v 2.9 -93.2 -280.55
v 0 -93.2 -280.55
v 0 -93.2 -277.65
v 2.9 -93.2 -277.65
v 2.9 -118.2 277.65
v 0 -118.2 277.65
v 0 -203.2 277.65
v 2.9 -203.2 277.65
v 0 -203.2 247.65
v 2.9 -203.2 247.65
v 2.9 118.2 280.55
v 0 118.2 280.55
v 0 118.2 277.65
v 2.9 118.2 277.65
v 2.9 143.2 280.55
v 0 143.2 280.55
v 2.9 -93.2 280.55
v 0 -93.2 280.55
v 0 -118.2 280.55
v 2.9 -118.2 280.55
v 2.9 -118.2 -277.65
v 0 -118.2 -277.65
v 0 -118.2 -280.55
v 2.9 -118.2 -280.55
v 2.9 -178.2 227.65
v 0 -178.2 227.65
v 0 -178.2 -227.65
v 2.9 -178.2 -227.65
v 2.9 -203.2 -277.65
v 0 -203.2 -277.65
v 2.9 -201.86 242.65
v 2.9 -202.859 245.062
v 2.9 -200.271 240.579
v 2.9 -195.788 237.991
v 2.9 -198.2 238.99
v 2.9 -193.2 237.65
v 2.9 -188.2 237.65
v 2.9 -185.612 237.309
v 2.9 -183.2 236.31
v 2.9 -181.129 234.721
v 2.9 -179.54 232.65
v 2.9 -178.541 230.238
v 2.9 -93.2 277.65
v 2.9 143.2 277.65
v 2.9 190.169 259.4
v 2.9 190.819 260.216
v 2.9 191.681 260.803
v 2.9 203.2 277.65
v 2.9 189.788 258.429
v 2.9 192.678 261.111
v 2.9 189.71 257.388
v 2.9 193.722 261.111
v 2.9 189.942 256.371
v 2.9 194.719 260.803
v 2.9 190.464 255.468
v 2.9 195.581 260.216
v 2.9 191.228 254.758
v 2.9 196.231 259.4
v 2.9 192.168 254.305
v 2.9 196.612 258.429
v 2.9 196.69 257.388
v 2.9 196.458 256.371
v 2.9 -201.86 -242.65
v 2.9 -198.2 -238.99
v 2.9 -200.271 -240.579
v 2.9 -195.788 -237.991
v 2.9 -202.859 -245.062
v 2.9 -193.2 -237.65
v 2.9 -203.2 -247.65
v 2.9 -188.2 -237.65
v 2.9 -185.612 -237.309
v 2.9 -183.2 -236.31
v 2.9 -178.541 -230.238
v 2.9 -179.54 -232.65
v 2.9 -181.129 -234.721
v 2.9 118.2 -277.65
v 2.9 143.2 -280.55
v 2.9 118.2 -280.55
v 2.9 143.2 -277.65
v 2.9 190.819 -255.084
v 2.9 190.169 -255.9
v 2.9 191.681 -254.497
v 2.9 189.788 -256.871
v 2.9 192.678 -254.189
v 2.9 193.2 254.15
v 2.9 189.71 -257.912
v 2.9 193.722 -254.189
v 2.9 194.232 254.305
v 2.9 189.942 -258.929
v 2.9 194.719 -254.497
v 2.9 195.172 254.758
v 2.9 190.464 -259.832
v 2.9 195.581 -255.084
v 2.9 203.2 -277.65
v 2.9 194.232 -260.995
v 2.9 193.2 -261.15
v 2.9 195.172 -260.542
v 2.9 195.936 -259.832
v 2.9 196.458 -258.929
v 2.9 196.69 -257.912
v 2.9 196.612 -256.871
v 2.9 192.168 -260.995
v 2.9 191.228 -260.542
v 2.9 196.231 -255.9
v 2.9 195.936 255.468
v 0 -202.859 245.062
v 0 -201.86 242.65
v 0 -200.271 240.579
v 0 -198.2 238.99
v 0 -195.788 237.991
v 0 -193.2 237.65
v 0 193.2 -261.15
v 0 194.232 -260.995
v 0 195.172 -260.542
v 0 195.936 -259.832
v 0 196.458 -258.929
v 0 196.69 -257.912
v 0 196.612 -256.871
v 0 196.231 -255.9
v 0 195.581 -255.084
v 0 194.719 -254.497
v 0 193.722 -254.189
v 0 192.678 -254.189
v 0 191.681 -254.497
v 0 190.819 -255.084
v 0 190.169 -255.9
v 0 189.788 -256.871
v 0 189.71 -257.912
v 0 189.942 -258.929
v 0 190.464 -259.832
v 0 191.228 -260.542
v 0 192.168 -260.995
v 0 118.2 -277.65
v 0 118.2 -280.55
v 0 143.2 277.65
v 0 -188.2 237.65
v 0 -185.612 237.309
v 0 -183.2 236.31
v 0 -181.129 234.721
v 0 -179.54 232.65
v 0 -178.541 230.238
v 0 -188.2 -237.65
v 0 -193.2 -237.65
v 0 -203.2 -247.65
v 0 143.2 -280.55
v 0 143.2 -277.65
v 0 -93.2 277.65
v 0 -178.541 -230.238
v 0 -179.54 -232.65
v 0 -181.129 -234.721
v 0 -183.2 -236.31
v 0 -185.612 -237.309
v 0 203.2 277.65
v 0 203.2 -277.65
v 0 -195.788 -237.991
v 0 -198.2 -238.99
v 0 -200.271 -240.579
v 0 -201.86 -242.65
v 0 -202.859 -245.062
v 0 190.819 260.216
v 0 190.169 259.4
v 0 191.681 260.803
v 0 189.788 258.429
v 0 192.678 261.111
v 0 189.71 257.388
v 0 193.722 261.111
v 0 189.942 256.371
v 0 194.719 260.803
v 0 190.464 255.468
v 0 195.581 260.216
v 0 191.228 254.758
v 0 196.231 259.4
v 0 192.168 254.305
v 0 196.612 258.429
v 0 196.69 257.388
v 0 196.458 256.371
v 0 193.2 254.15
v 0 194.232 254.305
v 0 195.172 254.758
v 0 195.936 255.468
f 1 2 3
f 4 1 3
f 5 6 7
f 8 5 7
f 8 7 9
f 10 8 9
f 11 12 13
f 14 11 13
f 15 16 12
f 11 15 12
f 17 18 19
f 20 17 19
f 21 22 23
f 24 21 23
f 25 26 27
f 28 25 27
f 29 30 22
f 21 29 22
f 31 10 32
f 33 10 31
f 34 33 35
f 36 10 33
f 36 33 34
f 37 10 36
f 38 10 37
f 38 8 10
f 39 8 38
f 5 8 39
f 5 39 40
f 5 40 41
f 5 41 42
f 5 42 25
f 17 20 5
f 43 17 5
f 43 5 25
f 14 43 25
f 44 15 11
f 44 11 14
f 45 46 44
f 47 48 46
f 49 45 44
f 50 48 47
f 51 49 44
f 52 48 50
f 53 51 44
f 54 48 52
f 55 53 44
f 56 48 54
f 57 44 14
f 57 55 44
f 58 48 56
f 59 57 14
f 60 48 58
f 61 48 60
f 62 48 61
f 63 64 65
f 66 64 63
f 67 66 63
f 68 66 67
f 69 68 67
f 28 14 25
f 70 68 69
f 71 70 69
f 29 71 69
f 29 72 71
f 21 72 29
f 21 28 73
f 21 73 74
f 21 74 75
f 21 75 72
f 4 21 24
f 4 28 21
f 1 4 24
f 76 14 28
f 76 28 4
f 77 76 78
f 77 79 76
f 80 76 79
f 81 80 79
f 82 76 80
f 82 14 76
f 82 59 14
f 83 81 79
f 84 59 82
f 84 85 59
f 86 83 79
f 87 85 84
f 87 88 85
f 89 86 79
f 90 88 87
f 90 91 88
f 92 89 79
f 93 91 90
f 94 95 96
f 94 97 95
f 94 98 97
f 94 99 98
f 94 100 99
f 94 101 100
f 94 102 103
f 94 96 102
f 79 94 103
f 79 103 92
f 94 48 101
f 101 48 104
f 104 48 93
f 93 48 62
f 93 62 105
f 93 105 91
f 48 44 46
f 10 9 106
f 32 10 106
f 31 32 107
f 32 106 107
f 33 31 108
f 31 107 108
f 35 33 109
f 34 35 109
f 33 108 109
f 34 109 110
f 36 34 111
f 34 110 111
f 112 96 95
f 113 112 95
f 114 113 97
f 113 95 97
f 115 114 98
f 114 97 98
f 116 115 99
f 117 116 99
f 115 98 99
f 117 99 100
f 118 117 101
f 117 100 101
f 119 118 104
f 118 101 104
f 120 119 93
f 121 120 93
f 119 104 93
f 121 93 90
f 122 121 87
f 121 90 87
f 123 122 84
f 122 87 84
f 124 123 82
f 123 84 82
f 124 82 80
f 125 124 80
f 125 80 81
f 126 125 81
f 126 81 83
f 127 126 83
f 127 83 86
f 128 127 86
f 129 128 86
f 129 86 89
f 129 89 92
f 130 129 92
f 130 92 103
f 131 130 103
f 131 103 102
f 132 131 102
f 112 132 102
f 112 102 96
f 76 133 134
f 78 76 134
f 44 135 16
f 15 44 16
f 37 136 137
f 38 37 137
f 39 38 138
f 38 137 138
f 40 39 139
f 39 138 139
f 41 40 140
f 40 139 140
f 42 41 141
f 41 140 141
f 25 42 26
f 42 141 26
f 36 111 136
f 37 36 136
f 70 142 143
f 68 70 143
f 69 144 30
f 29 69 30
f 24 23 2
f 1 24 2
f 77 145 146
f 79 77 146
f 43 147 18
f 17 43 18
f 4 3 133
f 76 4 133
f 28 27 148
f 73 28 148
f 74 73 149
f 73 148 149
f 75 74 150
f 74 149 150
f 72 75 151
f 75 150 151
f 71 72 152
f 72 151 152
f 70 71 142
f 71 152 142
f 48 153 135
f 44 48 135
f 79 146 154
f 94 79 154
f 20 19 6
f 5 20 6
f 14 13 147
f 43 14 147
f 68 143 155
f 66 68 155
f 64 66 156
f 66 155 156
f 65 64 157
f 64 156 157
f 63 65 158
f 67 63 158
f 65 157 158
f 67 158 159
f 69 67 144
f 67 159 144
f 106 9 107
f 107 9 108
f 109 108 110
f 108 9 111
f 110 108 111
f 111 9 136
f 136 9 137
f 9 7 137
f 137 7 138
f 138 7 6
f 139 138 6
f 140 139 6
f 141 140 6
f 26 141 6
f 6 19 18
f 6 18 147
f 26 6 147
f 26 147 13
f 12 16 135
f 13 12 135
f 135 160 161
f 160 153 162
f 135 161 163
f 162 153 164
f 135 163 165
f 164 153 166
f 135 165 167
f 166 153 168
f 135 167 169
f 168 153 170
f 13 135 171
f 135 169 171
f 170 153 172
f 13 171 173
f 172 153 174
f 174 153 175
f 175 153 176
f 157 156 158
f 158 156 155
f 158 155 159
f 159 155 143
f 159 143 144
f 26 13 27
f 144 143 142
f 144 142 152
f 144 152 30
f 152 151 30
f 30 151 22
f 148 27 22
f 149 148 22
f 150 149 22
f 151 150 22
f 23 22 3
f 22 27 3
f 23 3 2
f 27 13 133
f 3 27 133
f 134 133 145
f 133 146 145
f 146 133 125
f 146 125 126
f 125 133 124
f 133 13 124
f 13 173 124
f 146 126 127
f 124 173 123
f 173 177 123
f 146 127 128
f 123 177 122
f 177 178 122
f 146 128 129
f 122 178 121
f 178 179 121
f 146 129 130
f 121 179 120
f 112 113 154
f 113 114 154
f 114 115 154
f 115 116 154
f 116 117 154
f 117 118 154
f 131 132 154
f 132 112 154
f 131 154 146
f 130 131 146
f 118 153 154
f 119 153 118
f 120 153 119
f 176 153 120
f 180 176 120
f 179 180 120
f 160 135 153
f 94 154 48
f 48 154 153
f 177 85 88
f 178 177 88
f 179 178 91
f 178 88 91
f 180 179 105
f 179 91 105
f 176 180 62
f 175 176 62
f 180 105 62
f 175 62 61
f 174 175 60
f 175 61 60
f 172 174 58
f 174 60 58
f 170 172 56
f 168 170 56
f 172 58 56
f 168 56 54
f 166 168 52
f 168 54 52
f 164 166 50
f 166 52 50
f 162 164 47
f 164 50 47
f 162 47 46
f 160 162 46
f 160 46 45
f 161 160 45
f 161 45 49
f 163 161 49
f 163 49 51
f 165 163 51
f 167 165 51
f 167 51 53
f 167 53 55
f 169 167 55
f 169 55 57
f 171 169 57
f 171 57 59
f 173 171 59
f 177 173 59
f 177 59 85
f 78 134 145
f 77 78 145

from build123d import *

# Parameters (mm, degrees)
BOSS_EXTRUDE1_DEPTH = 2.9
SKETCH2_R           = 3.5
CUT_EXTRUDE1_DEPTH  = 3.9


with BuildPart() as part:
    # Sketch1 → Boss-Extrude1 (new body)
    with BuildSketch(Plane(origin=(0, 0, 0), x_dir=(0, 0, -1), z_dir=(1, 0, 0))):
        with BuildLine():
            Line((247.65, -203.2), (277.65, -203.2))
            Line((277.65, -203.2), (277.65, -118.2))
            Line((277.65, -118.2), (280.55, -118.2))
            Line((280.55, -118.2), (280.55, -93.2))
            Line((280.55, -93.2), (277.65, -93.2))
            Line((277.65, -93.2), (277.65, 118.2))
            Line((277.65, 118.2), (280.55, 118.2))
            Line((280.55, 118.2), (280.55, 143.2))
            Line((280.55, 143.2), (277.65, 143.2))
            Line((277.65, 143.2), (277.65, 203.2))
            Line((277.65, 203.2), (-277.65, 203.2))
            Line((-277.65, 203.2), (-277.65, 143.2))
            Line((-277.65, 143.2), (-280.55, 143.2))
            Line((-280.55, 143.2), (-280.55, 118.2))
            Line((-280.55, 118.2), (-277.65, 118.2))
            Line((-277.65, 118.2), (-277.65, -93.2))
            Line((-277.65, -93.2), (-280.55, -93.2))
            Line((-280.55, -93.2), (-280.55, -118.2))
            Line((-280.55, -118.2), (-277.65, -118.2))
            Line((-277.65, -118.2), (-277.65, -203.2))
            Line((-277.65, -203.2), (-247.65, -203.2))
            ThreePointArc((-247.65, -203.2), (-240.578932188, -200.271067812), (-237.65, -193.2))
            Line((-237.65, -193.2), (-237.65, -188.2))
            ThreePointArc((-237.65, -188.2), (-234.721067812, -181.128932188), (-227.65, -178.2))
            Line((-227.65, -178.2), (227.65, -178.2))
            ThreePointArc((227.65, -178.2), (234.721067812, -181.128932188), (237.65, -188.2))
            Line((237.65, -188.2), (237.65, -193.2))
            ThreePointArc((237.65, -193.2), (240.578932188, -200.271067812), (247.65, -203.2))
        make_face()
    extrude(amount=BOSS_EXTRUDE1_DEPTH)

    # Sketch2 → Cut-Extrude1 (cut, through all)
    with BuildSketch(Plane(origin=(2.9, 0, 0), x_dir=(0, 0, -1), z_dir=(1, 0, 0))):
        with Locations((-257.65, 193.2)):
            Circle(SKETCH2_R)
        with Locations((257.65, 193.2)):
            Circle(SKETCH2_R)
    extrude(amount=-CUT_EXTRUDE1_DEPTH, mode=Mode.SUBTRACT)


solid = part.part
